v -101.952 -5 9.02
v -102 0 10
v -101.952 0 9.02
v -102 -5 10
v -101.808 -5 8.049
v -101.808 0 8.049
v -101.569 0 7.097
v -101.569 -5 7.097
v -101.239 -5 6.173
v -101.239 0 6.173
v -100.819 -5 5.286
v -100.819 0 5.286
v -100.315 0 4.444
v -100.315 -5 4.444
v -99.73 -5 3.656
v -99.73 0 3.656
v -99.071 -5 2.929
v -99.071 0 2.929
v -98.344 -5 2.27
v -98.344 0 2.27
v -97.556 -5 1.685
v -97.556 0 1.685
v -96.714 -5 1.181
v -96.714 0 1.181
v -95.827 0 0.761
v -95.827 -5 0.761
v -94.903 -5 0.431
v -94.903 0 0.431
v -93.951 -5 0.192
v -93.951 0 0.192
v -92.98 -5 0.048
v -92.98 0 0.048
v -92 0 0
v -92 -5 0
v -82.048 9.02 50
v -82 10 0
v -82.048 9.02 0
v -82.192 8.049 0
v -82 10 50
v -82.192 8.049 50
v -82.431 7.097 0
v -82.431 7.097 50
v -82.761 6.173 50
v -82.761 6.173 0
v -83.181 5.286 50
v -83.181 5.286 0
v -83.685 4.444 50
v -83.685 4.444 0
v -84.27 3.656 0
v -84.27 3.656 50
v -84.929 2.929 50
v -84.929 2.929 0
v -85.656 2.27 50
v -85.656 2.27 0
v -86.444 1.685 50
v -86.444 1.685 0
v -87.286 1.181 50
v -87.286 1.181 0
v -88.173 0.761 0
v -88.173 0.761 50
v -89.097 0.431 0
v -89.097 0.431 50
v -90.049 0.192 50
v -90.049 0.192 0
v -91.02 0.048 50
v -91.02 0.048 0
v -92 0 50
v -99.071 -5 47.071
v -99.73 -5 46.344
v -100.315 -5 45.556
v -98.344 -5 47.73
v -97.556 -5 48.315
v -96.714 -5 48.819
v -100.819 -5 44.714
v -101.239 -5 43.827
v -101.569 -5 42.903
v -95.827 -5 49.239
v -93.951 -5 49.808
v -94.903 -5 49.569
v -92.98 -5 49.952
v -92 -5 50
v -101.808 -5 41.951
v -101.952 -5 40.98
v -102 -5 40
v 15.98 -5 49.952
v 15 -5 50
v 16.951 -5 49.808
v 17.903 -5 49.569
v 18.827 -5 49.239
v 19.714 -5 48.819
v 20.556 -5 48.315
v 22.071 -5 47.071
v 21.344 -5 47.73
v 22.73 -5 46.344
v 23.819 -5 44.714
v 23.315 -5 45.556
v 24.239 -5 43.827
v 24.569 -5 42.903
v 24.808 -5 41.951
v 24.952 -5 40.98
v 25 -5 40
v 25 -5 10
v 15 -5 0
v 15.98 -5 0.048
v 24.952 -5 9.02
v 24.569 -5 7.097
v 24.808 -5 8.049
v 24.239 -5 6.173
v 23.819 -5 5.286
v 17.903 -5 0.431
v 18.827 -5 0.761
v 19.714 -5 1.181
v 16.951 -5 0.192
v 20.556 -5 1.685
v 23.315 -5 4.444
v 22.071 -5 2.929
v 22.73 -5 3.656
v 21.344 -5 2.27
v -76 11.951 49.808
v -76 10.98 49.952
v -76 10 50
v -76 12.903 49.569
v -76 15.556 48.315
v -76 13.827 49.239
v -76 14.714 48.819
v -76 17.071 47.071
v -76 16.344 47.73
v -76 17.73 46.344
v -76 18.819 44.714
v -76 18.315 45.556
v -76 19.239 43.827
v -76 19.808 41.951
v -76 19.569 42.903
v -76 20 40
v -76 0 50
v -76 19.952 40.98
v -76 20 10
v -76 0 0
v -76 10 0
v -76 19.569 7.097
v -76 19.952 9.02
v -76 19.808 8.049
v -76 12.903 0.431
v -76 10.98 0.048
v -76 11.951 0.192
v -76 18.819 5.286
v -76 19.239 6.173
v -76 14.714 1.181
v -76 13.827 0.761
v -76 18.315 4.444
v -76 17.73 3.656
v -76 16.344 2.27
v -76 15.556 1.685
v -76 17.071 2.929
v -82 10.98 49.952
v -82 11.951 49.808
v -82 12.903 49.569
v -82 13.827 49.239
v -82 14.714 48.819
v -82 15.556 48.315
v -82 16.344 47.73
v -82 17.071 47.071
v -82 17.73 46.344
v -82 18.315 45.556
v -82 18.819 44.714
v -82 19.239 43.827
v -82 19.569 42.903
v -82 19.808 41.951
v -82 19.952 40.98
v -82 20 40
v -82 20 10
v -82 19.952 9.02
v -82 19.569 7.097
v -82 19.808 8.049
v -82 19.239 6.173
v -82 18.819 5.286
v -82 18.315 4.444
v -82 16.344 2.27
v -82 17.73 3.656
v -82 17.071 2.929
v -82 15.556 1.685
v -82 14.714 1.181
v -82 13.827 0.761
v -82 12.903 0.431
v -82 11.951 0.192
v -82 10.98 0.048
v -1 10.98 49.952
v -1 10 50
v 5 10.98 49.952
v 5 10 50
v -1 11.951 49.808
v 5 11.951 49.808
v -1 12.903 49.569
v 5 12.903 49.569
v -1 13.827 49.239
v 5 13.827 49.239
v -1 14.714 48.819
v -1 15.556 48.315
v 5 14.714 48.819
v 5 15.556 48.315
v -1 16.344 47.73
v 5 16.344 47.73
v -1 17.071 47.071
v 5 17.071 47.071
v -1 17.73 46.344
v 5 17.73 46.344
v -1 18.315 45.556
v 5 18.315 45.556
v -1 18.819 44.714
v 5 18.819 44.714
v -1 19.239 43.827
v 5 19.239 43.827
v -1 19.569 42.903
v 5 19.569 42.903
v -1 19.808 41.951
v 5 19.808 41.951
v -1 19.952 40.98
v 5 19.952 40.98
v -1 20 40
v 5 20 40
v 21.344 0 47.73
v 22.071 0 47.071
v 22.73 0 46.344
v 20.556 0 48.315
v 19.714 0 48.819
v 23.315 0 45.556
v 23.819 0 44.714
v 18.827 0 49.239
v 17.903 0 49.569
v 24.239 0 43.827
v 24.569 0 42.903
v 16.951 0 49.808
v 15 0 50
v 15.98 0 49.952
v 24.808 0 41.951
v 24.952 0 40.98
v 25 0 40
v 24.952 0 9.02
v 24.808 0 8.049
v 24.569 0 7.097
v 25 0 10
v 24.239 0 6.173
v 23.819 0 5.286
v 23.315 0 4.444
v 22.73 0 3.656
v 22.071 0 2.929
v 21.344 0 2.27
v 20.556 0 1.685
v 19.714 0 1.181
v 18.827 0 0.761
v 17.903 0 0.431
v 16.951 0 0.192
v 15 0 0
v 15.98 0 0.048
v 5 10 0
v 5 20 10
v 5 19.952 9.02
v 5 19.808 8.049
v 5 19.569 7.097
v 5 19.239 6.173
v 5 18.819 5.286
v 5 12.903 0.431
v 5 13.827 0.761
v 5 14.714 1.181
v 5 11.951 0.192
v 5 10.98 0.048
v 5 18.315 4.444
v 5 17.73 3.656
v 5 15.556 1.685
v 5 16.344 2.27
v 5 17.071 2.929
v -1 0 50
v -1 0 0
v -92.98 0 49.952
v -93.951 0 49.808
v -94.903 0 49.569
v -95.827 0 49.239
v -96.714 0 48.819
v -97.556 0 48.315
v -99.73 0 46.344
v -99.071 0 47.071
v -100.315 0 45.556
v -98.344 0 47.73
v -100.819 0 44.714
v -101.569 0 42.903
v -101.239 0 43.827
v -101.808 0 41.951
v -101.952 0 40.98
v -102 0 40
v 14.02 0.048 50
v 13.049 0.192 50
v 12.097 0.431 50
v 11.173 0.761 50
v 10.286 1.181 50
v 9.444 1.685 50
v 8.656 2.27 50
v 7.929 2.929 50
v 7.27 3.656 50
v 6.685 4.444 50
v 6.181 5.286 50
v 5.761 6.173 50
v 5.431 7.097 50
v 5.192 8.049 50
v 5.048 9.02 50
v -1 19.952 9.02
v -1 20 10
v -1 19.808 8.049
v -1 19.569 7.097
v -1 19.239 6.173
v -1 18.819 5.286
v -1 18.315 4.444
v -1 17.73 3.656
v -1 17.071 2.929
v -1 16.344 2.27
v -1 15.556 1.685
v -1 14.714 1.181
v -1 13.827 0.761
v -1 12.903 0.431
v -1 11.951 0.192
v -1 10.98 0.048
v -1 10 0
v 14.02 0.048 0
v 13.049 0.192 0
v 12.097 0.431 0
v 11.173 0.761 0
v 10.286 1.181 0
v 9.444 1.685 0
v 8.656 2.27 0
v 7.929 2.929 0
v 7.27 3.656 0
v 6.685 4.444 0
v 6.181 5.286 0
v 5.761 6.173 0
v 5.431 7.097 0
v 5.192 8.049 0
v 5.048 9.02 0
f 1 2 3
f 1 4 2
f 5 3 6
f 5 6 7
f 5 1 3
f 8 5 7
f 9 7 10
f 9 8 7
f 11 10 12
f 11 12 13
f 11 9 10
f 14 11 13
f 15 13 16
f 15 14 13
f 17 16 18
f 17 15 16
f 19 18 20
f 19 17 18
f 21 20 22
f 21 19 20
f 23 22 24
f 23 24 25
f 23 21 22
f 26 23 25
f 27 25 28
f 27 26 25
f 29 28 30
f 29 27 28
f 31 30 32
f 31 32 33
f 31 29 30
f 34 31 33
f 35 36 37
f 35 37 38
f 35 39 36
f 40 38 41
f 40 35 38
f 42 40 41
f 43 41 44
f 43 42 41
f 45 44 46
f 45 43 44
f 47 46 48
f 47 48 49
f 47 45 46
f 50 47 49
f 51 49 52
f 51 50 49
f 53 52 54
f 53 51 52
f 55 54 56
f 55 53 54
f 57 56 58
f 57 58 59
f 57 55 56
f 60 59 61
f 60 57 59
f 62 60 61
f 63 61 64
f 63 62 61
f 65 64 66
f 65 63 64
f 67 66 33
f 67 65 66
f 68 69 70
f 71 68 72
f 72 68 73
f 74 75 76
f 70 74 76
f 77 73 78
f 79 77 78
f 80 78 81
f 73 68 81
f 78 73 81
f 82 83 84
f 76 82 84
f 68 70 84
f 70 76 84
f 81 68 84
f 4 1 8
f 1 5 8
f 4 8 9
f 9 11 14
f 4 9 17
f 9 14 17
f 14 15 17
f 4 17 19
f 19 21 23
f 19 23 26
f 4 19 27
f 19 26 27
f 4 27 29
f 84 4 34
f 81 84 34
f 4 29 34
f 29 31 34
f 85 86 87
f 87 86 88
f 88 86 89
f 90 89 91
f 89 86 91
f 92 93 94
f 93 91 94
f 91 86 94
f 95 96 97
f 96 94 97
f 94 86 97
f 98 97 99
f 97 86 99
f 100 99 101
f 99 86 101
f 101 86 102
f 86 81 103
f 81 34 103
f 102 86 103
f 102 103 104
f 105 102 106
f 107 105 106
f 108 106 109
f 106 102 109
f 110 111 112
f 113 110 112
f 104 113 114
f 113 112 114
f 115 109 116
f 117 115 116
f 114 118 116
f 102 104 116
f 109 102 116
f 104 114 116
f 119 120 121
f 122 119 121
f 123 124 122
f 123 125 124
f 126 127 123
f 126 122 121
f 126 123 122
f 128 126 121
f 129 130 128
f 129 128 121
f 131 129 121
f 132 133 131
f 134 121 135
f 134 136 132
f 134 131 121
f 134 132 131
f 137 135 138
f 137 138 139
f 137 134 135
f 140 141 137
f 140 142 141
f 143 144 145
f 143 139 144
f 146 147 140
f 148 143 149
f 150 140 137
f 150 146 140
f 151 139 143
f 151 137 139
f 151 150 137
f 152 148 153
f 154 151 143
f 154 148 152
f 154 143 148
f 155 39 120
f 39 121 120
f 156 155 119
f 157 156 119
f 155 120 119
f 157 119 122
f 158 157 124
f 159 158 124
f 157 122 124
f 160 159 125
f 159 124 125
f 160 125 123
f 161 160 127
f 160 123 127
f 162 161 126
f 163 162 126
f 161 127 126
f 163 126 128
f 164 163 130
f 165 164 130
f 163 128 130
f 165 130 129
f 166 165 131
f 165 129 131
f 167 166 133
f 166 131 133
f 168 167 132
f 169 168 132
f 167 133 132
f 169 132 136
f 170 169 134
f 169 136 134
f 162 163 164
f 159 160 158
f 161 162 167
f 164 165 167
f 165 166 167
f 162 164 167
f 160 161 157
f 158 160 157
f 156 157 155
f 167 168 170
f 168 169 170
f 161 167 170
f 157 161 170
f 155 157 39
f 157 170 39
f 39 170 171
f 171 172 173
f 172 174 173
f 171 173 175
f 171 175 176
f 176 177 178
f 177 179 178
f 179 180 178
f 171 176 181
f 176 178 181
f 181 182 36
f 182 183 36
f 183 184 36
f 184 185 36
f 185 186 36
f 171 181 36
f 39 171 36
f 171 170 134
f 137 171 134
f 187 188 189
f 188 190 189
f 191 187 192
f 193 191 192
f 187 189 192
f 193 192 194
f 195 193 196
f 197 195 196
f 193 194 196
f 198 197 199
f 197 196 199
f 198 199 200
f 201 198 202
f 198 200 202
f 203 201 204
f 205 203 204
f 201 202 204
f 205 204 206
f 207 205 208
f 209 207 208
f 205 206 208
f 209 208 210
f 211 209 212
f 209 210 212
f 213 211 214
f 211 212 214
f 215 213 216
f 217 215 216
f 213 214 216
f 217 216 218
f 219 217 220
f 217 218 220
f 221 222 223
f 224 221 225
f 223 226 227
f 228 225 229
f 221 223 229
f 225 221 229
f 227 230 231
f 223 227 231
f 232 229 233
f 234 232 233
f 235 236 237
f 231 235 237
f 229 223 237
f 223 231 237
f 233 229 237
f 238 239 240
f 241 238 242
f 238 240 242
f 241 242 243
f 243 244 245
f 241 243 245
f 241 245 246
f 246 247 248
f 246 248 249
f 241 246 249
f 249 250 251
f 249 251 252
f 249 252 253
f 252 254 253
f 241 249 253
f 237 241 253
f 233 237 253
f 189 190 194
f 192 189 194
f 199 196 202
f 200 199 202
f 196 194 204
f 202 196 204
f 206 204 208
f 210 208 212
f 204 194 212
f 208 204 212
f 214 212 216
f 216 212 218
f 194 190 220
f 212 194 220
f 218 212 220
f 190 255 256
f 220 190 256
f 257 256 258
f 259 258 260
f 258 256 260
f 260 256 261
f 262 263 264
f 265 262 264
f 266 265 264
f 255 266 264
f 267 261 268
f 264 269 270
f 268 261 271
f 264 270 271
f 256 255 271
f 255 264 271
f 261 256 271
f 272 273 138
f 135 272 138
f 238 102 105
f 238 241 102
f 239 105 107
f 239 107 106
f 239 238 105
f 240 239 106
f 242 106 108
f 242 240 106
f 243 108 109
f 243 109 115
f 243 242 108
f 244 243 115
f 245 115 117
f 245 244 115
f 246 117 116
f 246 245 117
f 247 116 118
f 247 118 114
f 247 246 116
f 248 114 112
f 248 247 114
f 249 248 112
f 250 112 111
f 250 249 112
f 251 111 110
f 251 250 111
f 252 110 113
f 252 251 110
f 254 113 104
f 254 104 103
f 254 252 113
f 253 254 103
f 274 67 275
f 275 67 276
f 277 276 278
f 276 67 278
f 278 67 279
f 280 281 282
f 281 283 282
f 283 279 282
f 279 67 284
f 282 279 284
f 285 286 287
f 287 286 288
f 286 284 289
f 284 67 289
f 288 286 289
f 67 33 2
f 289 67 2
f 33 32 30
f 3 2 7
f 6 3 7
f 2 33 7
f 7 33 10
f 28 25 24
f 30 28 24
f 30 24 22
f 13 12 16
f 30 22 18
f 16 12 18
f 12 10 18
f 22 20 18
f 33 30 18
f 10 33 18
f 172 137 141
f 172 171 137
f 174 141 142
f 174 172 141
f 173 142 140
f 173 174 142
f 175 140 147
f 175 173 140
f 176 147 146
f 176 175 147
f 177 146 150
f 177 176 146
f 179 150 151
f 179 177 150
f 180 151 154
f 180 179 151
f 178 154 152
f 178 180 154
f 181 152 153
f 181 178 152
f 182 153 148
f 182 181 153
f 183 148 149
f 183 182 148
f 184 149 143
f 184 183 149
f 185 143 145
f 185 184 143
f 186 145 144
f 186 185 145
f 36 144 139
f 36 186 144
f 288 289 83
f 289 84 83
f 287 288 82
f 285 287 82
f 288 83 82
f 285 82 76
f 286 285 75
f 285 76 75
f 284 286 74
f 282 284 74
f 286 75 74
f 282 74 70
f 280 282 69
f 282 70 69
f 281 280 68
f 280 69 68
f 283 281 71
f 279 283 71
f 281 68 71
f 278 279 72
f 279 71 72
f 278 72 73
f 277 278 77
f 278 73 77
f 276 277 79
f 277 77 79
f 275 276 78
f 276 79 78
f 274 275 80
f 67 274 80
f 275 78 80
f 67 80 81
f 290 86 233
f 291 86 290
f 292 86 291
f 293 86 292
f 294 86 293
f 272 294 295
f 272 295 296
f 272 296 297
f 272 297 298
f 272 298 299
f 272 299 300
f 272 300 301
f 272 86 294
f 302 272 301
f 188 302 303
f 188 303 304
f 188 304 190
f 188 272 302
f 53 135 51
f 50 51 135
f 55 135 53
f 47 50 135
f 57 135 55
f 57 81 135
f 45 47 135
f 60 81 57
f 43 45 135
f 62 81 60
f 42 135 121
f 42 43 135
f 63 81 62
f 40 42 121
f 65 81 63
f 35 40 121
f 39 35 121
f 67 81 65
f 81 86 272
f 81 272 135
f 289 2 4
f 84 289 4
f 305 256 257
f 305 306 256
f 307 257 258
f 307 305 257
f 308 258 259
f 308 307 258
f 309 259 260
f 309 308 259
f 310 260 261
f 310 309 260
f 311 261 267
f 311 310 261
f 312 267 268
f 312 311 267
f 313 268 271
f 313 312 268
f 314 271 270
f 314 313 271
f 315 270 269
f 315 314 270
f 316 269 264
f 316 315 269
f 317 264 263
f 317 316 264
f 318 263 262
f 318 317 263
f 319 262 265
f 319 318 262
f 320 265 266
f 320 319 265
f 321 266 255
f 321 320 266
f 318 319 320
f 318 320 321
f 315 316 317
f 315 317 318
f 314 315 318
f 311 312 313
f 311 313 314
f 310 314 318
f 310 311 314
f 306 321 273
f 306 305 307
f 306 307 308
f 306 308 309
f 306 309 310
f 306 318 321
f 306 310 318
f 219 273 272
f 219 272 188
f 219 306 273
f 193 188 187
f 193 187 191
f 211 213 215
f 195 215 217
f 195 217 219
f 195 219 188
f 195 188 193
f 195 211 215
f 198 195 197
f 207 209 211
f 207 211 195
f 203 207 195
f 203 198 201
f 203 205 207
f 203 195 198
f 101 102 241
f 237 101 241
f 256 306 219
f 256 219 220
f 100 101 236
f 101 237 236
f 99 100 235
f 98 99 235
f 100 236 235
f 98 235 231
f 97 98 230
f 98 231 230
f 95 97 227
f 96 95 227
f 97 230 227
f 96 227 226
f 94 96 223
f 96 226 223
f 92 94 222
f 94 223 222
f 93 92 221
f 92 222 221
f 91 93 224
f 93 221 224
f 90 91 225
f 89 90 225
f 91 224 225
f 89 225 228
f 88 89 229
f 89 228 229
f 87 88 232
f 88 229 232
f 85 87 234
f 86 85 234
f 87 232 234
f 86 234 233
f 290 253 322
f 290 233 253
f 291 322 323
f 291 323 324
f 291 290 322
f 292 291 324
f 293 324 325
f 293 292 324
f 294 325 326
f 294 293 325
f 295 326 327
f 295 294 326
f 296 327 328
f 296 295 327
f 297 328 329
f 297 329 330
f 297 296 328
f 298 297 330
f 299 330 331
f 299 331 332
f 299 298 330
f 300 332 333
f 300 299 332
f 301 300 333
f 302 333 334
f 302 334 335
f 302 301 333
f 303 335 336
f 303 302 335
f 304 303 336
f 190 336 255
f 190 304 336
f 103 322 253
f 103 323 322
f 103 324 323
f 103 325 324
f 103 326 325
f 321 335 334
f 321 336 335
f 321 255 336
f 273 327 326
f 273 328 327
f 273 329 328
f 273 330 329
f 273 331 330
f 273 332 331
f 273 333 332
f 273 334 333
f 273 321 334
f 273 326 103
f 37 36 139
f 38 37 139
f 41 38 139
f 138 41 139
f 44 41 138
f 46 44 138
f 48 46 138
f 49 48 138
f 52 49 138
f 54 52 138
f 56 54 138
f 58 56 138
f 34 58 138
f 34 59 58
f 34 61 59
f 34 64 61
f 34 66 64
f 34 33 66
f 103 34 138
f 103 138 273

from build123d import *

# Parameters (mm, degrees)
BOSS_EXTRUDE1_DEPTH = 50
FILLET1_R           = 10
BOSS_EXTRUDE2_DEPTH = 1
BOSS_EXTRUDE3_START = 1
BOSS_EXTRUDE3_DEPTH = 1
SKETCH4_W           = 87
SKETCH4_H           = 20
CUT_EXTRUDE1_DEPTH  = 93
FILLET2_R           = 10


with BuildPart() as part:
    # Sketch1 → Boss-Extrude1 (new body)
    with BuildSketch(Plane.XY):
        Polygon((0, 0), (-77, 0), (-77, 40), (-82, 40), (-82, 0), (-102, 0), (-102, -5), (25, -5), (25, 0), (5, 0), (5, 40), (0, 40), align=None)
    extrude(amount=BOSS_EXTRUDE1_DEPTH)

    # Fillet1
    fillet1_edges = [part.edges().sort_by_distance(p)[0] for p in [
        (25, -2.5, 0),
        (25, -2.5, 50),
        (-102, -2.5, 0),
        (-102, -2.5, 50),
        (2.5, 40, 50),
        (2.5, 40, 0),
        (-79.5, 40, 0),
        (-79.5, 40, 50),
        (-82, 0, 25),
        (5, 0, 25),
    ]]
    fillet(fillet1_edges, radius=FILLET1_R - 0.0001)  # a hair under: the kernel refuses the full size

    # Sketch2 → Boss-Extrude2 (add)
    with BuildSketch(Plane(origin=(-77, 0, 0), x_dir=(0, 0, -1), z_dir=(1, 0, 0))):
        with BuildLine():
            Line((0, 0), (0, 30))
            ThreePointArc((0, 30), (-2.928932188, 37.071067812), (-10, 40))
            Line((-10, 40), (-40, 40))
            ThreePointArc((-40, 40), (-47.071067812, 37.071067812), (-50, 30))
            Line((-50, 30), (-50, 0))
            Line((-50, 0), (0, 0))
        make_face()
    extrude(amount=BOSS_EXTRUDE2_DEPTH)

    # Sketch3 → Boss-Extrude3 (add)
    with BuildSketch(Plane.ZY.offset(BOSS_EXTRUDE3_START)):
        with BuildLine():
            Line((50, 0), (50, 30))
            ThreePointArc((50, 30), (47.071067812, 37.071067812), (40, 40))
            Line((40, 40), (10, 40))
            ThreePointArc((10, 40), (2.928932188, 37.071067812), (0, 30))
            Line((0, 30), (0, 0))
            Line((0, 0), (50, 0))
        make_face()
    extrude(amount=-BOSS_EXTRUDE3_DEPTH)

    # Sketch4 → Cut-Extrude1 (cut)
    with BuildSketch(Plane.XY.offset(50)):
        with Locations((-38.5, 30)):
            Rectangle(SKETCH4_W, SKETCH4_H)
    extrude(amount=-CUT_EXTRUDE1_DEPTH, mode=Mode.SUBTRACT)

    # Fillet2
    fillet2_edges = [part.edges().sort_by_distance(p)[0] for p in [
        (2, 20, 0),
        (2, 20, 50),
        (-79, 20, 0),
        (-79, 20, 50),
    ]]
    fillet(fillet2_edges, radius=FILLET2_R)


solid = part.part
